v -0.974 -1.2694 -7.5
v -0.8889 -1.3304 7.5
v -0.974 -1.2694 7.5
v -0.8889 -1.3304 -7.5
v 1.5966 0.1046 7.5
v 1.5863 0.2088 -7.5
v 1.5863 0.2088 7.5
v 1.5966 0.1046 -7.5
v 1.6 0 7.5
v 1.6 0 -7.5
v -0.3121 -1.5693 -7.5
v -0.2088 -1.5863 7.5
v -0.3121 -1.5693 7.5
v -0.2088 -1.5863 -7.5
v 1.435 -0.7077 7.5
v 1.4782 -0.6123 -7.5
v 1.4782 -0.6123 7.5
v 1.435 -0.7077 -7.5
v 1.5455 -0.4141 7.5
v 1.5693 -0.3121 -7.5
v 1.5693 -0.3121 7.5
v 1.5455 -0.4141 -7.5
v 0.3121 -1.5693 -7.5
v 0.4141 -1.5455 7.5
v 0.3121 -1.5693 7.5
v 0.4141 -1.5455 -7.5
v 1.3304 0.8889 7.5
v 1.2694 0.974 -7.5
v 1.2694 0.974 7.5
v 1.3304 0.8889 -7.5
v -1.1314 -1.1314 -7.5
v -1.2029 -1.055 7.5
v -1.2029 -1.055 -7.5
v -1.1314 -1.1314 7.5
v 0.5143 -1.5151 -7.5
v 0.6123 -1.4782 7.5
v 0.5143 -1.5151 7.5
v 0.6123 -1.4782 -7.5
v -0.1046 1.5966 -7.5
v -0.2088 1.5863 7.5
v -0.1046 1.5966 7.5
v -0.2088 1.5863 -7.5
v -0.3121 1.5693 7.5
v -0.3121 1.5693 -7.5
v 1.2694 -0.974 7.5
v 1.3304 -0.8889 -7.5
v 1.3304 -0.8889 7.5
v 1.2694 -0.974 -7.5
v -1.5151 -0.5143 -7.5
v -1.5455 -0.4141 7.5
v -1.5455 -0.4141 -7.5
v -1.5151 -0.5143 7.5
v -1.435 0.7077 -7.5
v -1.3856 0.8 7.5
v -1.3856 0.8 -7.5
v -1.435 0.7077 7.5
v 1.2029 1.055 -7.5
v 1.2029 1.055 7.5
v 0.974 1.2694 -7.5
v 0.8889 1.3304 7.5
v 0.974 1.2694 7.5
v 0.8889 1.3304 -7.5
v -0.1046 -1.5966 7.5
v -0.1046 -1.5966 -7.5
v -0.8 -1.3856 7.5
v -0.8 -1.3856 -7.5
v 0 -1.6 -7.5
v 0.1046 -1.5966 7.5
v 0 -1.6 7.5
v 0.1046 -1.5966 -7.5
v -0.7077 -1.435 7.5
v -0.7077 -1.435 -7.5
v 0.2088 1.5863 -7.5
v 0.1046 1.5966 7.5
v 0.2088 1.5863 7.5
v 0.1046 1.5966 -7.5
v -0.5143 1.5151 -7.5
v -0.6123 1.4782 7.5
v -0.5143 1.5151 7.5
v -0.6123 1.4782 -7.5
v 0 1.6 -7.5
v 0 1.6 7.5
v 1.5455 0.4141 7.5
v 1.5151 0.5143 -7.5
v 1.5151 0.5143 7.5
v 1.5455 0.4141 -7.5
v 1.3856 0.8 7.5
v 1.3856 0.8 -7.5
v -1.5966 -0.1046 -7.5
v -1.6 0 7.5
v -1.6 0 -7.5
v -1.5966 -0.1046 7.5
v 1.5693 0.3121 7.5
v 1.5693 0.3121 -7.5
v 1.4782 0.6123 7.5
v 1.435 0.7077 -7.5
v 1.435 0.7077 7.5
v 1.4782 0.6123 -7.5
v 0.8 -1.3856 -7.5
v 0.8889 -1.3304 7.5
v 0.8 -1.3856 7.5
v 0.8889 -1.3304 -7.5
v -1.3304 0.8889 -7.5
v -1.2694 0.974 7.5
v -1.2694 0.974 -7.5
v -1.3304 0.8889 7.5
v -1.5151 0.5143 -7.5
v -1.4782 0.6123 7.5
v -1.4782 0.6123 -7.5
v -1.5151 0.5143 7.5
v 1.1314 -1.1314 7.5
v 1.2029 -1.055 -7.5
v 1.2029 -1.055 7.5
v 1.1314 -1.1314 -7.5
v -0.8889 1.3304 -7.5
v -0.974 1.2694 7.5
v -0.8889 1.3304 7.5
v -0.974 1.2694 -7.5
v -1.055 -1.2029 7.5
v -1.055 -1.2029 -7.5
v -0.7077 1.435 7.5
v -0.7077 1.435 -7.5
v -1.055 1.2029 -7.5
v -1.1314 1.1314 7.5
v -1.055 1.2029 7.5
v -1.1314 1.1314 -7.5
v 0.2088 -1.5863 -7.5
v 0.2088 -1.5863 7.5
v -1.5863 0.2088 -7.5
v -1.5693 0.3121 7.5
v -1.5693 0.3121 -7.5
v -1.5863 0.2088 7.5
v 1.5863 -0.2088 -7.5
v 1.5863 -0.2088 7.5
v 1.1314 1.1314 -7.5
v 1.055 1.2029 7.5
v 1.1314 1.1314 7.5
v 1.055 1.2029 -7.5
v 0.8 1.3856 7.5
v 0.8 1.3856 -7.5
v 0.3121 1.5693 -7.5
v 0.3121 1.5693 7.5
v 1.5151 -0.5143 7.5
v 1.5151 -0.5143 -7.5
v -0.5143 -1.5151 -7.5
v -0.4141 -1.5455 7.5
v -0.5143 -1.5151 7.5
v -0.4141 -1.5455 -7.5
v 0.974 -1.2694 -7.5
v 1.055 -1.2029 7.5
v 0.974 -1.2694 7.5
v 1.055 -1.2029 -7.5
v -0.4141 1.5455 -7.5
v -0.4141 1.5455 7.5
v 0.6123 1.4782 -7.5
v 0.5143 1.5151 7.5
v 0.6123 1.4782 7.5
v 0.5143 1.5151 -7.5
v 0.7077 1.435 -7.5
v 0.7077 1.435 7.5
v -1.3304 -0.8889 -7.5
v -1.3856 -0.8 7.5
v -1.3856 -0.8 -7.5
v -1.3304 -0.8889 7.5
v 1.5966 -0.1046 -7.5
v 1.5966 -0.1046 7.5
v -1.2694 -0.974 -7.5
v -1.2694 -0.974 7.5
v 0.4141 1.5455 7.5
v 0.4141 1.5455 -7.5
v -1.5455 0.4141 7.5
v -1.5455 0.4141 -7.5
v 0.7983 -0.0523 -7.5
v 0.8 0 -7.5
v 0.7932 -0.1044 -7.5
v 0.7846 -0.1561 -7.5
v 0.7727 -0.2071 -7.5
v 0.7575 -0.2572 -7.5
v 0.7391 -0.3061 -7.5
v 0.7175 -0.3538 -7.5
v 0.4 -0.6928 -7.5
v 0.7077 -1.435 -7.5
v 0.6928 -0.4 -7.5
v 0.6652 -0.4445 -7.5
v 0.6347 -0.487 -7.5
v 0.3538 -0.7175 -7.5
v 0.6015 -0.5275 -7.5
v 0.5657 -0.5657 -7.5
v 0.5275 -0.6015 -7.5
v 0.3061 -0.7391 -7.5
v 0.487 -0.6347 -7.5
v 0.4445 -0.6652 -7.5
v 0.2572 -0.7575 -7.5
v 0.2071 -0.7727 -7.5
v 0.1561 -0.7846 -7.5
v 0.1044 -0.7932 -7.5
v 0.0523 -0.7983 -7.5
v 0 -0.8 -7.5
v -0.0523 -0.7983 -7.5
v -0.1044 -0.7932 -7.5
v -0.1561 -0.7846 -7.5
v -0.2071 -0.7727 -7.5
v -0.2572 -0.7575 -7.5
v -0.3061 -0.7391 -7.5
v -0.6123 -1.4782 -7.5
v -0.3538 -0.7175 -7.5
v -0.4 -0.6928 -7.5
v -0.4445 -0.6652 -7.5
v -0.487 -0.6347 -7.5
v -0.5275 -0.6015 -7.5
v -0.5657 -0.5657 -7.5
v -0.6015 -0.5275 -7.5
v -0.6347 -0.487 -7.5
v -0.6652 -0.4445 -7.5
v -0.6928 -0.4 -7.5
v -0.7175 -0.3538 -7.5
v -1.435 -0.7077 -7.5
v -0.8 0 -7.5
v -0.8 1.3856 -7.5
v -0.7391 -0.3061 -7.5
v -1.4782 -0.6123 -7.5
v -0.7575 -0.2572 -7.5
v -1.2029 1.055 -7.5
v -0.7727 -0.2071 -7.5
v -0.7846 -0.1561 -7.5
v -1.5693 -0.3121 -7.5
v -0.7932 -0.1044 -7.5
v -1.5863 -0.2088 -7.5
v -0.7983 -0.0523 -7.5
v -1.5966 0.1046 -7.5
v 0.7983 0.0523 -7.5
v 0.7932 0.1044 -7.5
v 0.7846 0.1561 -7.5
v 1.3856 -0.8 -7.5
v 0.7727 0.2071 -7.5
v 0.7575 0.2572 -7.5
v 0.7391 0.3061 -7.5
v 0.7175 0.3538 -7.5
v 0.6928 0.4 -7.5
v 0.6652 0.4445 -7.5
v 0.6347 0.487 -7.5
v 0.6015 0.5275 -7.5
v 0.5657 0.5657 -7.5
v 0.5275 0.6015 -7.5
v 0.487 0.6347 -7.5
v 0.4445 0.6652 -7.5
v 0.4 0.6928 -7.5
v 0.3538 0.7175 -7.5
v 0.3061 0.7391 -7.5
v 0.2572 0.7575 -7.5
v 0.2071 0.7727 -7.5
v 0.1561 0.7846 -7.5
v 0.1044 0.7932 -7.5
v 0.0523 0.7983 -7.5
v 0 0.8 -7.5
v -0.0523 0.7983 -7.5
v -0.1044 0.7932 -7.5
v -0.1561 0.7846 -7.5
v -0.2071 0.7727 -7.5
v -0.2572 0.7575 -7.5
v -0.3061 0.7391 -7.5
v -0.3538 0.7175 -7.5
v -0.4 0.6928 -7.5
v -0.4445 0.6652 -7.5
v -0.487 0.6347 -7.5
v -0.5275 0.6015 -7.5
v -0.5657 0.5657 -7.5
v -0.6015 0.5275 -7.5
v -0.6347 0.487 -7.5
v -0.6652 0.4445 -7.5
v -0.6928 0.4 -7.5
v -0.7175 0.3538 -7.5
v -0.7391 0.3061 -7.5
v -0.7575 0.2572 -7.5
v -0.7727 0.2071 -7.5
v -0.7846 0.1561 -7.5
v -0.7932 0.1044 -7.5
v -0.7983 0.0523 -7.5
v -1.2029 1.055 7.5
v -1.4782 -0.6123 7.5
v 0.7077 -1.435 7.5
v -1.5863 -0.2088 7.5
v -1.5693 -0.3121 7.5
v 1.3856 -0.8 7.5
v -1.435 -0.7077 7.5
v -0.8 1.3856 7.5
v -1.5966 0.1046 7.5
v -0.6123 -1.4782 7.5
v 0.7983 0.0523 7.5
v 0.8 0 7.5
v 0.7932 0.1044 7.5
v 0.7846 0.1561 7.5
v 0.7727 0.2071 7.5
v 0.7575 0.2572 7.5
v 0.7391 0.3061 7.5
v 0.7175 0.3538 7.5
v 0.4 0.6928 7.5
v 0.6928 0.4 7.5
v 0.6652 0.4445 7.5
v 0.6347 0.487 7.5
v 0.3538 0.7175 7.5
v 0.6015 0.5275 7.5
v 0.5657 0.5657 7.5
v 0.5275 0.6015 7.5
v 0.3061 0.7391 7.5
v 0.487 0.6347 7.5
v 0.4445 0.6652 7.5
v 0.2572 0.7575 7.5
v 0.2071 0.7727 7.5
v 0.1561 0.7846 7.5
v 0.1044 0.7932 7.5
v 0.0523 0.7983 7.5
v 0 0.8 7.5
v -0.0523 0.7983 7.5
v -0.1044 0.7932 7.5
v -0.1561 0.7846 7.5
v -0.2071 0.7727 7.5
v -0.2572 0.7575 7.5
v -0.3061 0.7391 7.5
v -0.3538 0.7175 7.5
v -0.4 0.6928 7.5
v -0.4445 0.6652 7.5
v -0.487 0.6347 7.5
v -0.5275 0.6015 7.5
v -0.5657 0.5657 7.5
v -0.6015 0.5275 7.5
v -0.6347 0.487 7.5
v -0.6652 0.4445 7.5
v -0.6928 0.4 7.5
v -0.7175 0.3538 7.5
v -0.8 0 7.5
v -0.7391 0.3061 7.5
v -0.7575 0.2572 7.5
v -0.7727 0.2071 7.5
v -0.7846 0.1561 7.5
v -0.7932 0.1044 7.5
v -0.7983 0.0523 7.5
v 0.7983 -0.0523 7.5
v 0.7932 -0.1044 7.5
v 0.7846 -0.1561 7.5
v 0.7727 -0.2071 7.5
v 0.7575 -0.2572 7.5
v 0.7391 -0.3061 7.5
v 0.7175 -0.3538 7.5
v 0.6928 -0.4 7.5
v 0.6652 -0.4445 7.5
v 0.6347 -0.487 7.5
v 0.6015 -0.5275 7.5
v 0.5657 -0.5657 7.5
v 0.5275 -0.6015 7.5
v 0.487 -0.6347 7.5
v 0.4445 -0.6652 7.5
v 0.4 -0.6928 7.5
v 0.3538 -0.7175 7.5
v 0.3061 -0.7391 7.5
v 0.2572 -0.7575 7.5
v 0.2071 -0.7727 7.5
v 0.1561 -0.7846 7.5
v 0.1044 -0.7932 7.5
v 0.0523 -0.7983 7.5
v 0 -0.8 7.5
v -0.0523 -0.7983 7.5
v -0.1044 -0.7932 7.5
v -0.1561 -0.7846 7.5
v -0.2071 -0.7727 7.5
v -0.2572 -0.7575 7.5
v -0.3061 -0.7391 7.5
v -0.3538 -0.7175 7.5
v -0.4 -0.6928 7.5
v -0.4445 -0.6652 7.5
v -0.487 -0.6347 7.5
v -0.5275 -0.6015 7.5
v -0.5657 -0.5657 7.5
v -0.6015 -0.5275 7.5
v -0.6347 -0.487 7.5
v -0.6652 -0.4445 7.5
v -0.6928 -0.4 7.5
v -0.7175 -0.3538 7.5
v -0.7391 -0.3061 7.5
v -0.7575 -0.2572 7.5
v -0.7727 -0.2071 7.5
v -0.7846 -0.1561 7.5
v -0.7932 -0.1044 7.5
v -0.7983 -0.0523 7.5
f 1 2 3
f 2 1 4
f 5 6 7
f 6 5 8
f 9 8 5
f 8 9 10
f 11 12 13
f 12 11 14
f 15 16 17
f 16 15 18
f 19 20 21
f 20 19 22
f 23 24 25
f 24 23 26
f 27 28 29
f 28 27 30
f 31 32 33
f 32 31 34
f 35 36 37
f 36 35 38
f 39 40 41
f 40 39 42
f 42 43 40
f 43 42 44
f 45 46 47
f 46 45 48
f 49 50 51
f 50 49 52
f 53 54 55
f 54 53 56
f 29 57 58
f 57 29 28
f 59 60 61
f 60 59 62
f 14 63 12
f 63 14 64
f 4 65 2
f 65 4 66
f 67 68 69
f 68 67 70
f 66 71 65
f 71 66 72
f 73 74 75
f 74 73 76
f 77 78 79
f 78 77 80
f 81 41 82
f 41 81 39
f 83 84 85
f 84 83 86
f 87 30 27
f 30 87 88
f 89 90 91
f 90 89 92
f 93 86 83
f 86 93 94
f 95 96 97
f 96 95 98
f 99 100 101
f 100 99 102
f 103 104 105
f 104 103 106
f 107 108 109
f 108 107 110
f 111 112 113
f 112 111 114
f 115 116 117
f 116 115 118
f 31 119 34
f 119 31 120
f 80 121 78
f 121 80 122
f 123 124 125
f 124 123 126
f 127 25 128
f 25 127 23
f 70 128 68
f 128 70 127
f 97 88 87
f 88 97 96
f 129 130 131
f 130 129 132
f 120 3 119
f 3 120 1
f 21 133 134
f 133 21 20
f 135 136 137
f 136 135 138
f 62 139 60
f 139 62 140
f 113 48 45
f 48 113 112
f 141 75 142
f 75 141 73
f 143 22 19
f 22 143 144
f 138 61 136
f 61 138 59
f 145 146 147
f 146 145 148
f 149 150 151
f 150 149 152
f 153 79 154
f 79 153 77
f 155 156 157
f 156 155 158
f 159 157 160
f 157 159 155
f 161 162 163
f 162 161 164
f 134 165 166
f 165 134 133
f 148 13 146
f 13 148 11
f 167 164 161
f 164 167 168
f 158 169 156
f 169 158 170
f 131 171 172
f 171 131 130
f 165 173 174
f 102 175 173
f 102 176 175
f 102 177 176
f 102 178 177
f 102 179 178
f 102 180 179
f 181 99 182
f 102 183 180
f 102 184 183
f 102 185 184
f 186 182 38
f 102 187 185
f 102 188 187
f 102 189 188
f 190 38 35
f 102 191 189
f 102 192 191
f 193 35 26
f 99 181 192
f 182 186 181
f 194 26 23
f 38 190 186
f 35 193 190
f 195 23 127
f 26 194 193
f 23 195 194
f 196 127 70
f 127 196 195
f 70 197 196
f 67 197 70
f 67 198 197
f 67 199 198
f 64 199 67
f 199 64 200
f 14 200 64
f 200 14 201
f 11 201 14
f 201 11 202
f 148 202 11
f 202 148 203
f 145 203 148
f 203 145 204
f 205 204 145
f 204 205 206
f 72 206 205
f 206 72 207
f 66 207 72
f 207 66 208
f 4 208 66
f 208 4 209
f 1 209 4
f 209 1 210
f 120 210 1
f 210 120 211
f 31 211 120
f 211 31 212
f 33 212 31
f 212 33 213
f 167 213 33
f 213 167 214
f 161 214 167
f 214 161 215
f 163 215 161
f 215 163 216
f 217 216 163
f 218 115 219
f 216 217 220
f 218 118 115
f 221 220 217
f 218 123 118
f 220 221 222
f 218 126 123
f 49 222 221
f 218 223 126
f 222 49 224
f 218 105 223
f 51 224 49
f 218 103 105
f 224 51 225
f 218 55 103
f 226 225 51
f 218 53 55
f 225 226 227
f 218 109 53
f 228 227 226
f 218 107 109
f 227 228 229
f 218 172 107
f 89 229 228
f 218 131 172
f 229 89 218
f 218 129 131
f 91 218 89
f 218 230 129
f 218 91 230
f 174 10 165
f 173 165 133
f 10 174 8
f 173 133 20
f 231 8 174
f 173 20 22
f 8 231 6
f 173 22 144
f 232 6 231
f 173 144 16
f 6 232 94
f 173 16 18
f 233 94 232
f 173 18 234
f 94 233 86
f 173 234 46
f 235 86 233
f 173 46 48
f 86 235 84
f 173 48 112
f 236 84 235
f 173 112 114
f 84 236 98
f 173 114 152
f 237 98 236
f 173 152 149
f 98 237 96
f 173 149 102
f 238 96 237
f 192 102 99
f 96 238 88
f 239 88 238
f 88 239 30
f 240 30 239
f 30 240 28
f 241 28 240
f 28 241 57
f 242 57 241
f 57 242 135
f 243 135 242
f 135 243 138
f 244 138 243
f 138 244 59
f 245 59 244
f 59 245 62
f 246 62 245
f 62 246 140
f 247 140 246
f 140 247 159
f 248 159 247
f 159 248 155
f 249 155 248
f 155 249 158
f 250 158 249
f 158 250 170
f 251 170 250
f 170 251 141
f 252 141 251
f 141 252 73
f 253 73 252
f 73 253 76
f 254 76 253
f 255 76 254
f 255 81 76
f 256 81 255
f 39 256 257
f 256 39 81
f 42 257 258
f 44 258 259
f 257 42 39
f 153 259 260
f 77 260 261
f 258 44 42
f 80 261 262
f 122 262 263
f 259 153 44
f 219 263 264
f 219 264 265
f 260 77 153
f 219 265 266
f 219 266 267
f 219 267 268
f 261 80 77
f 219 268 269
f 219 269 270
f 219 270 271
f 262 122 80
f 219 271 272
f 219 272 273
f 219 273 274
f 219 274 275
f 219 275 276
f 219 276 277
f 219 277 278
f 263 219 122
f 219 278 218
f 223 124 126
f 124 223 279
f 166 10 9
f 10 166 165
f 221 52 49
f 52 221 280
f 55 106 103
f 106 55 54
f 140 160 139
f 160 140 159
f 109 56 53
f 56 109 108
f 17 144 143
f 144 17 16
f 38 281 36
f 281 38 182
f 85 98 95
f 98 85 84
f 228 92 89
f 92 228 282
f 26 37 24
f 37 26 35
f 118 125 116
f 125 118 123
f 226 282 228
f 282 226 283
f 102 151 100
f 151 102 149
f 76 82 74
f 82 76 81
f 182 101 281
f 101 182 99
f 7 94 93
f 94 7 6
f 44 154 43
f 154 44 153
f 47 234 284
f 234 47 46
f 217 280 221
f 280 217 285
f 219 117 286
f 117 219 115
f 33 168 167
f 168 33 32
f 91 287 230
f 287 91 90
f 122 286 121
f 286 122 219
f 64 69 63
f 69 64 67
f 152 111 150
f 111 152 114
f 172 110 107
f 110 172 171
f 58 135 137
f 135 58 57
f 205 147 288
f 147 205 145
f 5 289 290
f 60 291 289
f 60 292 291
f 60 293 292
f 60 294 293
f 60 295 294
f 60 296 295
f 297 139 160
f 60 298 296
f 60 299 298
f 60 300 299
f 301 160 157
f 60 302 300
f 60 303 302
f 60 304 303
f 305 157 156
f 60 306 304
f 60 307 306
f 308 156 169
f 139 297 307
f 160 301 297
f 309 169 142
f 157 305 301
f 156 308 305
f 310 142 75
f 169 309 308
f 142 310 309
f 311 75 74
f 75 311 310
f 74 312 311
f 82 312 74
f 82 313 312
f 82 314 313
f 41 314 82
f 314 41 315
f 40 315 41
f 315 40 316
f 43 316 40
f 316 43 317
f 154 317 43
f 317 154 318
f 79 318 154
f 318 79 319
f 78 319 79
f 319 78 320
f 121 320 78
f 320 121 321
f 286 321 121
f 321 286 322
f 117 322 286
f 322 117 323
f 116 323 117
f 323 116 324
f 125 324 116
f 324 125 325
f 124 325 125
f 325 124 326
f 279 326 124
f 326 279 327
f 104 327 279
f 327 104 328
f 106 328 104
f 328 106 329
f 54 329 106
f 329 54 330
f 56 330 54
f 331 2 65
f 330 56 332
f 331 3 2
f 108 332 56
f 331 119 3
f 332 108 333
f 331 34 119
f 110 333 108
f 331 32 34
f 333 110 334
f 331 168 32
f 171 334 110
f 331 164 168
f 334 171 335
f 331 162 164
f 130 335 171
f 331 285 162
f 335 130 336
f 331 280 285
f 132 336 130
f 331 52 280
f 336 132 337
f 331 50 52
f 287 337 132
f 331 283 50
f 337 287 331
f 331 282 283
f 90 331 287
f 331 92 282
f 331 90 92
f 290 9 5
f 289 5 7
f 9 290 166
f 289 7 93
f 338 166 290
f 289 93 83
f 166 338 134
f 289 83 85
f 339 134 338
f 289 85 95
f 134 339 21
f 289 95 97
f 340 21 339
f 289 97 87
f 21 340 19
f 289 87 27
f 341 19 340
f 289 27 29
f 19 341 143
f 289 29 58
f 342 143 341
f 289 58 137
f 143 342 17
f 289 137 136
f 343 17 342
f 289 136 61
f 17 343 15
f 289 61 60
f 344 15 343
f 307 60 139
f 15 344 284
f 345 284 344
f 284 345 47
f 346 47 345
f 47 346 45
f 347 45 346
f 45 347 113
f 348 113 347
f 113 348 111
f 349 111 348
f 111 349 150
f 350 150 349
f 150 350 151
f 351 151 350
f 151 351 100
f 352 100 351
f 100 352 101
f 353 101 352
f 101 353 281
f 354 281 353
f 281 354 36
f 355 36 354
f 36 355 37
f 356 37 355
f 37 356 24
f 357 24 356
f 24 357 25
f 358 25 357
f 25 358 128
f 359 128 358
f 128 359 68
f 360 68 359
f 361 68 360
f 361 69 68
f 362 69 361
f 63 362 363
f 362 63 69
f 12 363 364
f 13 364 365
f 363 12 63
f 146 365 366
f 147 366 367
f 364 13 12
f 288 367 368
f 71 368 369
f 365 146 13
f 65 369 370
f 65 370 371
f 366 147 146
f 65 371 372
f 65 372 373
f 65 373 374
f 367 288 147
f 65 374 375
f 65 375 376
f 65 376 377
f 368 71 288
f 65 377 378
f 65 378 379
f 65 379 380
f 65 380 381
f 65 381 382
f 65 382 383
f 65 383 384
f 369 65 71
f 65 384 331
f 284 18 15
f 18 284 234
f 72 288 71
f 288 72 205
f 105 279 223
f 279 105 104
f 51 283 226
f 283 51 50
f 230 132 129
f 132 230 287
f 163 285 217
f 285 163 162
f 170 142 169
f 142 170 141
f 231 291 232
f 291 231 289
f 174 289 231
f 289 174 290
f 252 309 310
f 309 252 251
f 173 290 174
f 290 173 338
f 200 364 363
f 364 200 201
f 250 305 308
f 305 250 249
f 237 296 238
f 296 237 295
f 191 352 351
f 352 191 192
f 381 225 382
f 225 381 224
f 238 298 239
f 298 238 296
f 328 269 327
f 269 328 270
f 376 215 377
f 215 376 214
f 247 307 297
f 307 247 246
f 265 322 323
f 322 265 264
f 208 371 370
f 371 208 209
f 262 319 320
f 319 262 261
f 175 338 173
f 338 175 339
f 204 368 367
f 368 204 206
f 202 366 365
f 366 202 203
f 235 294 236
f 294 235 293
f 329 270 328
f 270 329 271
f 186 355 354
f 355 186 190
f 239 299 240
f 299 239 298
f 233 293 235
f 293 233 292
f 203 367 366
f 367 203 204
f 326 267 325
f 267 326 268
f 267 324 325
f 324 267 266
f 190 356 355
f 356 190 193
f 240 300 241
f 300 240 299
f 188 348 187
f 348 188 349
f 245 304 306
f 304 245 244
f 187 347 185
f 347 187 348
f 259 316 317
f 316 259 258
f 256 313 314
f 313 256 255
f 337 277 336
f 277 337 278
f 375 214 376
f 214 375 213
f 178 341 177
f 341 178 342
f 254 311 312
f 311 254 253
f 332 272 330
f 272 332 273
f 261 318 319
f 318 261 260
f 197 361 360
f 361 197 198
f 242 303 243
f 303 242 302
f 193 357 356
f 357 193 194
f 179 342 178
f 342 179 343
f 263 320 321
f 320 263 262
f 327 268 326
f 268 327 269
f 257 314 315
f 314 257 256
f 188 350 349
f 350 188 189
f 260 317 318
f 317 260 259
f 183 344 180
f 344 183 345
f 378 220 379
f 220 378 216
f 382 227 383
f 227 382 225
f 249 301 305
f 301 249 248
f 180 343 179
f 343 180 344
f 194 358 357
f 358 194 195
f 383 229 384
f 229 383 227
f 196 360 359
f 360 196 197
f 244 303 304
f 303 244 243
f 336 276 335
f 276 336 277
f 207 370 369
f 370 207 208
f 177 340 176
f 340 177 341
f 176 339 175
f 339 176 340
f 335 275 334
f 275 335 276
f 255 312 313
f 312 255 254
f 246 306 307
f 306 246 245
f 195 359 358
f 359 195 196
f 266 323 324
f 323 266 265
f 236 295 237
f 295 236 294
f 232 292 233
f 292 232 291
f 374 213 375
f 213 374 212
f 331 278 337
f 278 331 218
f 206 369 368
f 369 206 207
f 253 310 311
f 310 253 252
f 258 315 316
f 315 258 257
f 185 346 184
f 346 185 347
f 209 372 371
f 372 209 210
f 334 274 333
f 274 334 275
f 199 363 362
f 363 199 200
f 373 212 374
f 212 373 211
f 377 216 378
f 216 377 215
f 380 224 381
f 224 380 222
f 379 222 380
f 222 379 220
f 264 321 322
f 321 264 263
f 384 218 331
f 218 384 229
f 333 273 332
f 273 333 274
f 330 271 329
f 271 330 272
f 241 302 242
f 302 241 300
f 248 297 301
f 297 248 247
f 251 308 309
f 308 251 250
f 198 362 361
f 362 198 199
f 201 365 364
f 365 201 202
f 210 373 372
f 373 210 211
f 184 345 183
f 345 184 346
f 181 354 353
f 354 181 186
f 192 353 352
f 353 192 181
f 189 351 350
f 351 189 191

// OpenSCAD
// Heatshrink sleeving / tubing (single connected solid)

// Parameters
length = 15; //[8:60:1]
center = true; //[0:1:1]
forced_id = 0; //[0:20:1]
type_index = 1; //[1:3:1]
lib_id_1 = 1.6; //[0.8:3.2:0.1]
lib_od_1 = 3.2; //[1.6:6.4:0.1]
lib_id_2 = 2.4; //[1.2:4.8:0.1]
lib_od_2 = 4.8; //[2.4:9.6:0.1]
lib_id_3 = 3.2; //[1.6:6.4:0.1]
lib_od_3 = 6.4; //[3.2:12.8:0.1]
eps_overlap = 1; //[0.5:2:0.1]

$fn = 96;

// Helpers
function od_sel() = (type_index==1) ? lib_od_1 : (type_index==2) ? lib_od_2 : lib_od_3;
function id_sel() = (forced_id>0) ? forced_id : ((type_index==1) ? lib_id_1 : (type_index==2) ? lib_id_2 : lib_id_3);

module heatshrink_sleeve(len=length, od=od_sel(), id=id_sel(), centered=center) {
    // Ensure valid wall thickness and non-zero geometry
    od2 = max(od, 0.2);
    id2 = min(max(id, 0.0), od2 - 0.2);
    h2  = max(len, 0.2);

    color([0.85, 0.85, 0.8])
    difference() {
        cylinder(r=od2/2, h=h2, center=centered);
        cylinder(r=id2/2, h=h2 + 2*eps_overlap, center=centered);
    }
}

// Output: ONE connected solid (the sleeve itself)
heatshrink_sleeve();
